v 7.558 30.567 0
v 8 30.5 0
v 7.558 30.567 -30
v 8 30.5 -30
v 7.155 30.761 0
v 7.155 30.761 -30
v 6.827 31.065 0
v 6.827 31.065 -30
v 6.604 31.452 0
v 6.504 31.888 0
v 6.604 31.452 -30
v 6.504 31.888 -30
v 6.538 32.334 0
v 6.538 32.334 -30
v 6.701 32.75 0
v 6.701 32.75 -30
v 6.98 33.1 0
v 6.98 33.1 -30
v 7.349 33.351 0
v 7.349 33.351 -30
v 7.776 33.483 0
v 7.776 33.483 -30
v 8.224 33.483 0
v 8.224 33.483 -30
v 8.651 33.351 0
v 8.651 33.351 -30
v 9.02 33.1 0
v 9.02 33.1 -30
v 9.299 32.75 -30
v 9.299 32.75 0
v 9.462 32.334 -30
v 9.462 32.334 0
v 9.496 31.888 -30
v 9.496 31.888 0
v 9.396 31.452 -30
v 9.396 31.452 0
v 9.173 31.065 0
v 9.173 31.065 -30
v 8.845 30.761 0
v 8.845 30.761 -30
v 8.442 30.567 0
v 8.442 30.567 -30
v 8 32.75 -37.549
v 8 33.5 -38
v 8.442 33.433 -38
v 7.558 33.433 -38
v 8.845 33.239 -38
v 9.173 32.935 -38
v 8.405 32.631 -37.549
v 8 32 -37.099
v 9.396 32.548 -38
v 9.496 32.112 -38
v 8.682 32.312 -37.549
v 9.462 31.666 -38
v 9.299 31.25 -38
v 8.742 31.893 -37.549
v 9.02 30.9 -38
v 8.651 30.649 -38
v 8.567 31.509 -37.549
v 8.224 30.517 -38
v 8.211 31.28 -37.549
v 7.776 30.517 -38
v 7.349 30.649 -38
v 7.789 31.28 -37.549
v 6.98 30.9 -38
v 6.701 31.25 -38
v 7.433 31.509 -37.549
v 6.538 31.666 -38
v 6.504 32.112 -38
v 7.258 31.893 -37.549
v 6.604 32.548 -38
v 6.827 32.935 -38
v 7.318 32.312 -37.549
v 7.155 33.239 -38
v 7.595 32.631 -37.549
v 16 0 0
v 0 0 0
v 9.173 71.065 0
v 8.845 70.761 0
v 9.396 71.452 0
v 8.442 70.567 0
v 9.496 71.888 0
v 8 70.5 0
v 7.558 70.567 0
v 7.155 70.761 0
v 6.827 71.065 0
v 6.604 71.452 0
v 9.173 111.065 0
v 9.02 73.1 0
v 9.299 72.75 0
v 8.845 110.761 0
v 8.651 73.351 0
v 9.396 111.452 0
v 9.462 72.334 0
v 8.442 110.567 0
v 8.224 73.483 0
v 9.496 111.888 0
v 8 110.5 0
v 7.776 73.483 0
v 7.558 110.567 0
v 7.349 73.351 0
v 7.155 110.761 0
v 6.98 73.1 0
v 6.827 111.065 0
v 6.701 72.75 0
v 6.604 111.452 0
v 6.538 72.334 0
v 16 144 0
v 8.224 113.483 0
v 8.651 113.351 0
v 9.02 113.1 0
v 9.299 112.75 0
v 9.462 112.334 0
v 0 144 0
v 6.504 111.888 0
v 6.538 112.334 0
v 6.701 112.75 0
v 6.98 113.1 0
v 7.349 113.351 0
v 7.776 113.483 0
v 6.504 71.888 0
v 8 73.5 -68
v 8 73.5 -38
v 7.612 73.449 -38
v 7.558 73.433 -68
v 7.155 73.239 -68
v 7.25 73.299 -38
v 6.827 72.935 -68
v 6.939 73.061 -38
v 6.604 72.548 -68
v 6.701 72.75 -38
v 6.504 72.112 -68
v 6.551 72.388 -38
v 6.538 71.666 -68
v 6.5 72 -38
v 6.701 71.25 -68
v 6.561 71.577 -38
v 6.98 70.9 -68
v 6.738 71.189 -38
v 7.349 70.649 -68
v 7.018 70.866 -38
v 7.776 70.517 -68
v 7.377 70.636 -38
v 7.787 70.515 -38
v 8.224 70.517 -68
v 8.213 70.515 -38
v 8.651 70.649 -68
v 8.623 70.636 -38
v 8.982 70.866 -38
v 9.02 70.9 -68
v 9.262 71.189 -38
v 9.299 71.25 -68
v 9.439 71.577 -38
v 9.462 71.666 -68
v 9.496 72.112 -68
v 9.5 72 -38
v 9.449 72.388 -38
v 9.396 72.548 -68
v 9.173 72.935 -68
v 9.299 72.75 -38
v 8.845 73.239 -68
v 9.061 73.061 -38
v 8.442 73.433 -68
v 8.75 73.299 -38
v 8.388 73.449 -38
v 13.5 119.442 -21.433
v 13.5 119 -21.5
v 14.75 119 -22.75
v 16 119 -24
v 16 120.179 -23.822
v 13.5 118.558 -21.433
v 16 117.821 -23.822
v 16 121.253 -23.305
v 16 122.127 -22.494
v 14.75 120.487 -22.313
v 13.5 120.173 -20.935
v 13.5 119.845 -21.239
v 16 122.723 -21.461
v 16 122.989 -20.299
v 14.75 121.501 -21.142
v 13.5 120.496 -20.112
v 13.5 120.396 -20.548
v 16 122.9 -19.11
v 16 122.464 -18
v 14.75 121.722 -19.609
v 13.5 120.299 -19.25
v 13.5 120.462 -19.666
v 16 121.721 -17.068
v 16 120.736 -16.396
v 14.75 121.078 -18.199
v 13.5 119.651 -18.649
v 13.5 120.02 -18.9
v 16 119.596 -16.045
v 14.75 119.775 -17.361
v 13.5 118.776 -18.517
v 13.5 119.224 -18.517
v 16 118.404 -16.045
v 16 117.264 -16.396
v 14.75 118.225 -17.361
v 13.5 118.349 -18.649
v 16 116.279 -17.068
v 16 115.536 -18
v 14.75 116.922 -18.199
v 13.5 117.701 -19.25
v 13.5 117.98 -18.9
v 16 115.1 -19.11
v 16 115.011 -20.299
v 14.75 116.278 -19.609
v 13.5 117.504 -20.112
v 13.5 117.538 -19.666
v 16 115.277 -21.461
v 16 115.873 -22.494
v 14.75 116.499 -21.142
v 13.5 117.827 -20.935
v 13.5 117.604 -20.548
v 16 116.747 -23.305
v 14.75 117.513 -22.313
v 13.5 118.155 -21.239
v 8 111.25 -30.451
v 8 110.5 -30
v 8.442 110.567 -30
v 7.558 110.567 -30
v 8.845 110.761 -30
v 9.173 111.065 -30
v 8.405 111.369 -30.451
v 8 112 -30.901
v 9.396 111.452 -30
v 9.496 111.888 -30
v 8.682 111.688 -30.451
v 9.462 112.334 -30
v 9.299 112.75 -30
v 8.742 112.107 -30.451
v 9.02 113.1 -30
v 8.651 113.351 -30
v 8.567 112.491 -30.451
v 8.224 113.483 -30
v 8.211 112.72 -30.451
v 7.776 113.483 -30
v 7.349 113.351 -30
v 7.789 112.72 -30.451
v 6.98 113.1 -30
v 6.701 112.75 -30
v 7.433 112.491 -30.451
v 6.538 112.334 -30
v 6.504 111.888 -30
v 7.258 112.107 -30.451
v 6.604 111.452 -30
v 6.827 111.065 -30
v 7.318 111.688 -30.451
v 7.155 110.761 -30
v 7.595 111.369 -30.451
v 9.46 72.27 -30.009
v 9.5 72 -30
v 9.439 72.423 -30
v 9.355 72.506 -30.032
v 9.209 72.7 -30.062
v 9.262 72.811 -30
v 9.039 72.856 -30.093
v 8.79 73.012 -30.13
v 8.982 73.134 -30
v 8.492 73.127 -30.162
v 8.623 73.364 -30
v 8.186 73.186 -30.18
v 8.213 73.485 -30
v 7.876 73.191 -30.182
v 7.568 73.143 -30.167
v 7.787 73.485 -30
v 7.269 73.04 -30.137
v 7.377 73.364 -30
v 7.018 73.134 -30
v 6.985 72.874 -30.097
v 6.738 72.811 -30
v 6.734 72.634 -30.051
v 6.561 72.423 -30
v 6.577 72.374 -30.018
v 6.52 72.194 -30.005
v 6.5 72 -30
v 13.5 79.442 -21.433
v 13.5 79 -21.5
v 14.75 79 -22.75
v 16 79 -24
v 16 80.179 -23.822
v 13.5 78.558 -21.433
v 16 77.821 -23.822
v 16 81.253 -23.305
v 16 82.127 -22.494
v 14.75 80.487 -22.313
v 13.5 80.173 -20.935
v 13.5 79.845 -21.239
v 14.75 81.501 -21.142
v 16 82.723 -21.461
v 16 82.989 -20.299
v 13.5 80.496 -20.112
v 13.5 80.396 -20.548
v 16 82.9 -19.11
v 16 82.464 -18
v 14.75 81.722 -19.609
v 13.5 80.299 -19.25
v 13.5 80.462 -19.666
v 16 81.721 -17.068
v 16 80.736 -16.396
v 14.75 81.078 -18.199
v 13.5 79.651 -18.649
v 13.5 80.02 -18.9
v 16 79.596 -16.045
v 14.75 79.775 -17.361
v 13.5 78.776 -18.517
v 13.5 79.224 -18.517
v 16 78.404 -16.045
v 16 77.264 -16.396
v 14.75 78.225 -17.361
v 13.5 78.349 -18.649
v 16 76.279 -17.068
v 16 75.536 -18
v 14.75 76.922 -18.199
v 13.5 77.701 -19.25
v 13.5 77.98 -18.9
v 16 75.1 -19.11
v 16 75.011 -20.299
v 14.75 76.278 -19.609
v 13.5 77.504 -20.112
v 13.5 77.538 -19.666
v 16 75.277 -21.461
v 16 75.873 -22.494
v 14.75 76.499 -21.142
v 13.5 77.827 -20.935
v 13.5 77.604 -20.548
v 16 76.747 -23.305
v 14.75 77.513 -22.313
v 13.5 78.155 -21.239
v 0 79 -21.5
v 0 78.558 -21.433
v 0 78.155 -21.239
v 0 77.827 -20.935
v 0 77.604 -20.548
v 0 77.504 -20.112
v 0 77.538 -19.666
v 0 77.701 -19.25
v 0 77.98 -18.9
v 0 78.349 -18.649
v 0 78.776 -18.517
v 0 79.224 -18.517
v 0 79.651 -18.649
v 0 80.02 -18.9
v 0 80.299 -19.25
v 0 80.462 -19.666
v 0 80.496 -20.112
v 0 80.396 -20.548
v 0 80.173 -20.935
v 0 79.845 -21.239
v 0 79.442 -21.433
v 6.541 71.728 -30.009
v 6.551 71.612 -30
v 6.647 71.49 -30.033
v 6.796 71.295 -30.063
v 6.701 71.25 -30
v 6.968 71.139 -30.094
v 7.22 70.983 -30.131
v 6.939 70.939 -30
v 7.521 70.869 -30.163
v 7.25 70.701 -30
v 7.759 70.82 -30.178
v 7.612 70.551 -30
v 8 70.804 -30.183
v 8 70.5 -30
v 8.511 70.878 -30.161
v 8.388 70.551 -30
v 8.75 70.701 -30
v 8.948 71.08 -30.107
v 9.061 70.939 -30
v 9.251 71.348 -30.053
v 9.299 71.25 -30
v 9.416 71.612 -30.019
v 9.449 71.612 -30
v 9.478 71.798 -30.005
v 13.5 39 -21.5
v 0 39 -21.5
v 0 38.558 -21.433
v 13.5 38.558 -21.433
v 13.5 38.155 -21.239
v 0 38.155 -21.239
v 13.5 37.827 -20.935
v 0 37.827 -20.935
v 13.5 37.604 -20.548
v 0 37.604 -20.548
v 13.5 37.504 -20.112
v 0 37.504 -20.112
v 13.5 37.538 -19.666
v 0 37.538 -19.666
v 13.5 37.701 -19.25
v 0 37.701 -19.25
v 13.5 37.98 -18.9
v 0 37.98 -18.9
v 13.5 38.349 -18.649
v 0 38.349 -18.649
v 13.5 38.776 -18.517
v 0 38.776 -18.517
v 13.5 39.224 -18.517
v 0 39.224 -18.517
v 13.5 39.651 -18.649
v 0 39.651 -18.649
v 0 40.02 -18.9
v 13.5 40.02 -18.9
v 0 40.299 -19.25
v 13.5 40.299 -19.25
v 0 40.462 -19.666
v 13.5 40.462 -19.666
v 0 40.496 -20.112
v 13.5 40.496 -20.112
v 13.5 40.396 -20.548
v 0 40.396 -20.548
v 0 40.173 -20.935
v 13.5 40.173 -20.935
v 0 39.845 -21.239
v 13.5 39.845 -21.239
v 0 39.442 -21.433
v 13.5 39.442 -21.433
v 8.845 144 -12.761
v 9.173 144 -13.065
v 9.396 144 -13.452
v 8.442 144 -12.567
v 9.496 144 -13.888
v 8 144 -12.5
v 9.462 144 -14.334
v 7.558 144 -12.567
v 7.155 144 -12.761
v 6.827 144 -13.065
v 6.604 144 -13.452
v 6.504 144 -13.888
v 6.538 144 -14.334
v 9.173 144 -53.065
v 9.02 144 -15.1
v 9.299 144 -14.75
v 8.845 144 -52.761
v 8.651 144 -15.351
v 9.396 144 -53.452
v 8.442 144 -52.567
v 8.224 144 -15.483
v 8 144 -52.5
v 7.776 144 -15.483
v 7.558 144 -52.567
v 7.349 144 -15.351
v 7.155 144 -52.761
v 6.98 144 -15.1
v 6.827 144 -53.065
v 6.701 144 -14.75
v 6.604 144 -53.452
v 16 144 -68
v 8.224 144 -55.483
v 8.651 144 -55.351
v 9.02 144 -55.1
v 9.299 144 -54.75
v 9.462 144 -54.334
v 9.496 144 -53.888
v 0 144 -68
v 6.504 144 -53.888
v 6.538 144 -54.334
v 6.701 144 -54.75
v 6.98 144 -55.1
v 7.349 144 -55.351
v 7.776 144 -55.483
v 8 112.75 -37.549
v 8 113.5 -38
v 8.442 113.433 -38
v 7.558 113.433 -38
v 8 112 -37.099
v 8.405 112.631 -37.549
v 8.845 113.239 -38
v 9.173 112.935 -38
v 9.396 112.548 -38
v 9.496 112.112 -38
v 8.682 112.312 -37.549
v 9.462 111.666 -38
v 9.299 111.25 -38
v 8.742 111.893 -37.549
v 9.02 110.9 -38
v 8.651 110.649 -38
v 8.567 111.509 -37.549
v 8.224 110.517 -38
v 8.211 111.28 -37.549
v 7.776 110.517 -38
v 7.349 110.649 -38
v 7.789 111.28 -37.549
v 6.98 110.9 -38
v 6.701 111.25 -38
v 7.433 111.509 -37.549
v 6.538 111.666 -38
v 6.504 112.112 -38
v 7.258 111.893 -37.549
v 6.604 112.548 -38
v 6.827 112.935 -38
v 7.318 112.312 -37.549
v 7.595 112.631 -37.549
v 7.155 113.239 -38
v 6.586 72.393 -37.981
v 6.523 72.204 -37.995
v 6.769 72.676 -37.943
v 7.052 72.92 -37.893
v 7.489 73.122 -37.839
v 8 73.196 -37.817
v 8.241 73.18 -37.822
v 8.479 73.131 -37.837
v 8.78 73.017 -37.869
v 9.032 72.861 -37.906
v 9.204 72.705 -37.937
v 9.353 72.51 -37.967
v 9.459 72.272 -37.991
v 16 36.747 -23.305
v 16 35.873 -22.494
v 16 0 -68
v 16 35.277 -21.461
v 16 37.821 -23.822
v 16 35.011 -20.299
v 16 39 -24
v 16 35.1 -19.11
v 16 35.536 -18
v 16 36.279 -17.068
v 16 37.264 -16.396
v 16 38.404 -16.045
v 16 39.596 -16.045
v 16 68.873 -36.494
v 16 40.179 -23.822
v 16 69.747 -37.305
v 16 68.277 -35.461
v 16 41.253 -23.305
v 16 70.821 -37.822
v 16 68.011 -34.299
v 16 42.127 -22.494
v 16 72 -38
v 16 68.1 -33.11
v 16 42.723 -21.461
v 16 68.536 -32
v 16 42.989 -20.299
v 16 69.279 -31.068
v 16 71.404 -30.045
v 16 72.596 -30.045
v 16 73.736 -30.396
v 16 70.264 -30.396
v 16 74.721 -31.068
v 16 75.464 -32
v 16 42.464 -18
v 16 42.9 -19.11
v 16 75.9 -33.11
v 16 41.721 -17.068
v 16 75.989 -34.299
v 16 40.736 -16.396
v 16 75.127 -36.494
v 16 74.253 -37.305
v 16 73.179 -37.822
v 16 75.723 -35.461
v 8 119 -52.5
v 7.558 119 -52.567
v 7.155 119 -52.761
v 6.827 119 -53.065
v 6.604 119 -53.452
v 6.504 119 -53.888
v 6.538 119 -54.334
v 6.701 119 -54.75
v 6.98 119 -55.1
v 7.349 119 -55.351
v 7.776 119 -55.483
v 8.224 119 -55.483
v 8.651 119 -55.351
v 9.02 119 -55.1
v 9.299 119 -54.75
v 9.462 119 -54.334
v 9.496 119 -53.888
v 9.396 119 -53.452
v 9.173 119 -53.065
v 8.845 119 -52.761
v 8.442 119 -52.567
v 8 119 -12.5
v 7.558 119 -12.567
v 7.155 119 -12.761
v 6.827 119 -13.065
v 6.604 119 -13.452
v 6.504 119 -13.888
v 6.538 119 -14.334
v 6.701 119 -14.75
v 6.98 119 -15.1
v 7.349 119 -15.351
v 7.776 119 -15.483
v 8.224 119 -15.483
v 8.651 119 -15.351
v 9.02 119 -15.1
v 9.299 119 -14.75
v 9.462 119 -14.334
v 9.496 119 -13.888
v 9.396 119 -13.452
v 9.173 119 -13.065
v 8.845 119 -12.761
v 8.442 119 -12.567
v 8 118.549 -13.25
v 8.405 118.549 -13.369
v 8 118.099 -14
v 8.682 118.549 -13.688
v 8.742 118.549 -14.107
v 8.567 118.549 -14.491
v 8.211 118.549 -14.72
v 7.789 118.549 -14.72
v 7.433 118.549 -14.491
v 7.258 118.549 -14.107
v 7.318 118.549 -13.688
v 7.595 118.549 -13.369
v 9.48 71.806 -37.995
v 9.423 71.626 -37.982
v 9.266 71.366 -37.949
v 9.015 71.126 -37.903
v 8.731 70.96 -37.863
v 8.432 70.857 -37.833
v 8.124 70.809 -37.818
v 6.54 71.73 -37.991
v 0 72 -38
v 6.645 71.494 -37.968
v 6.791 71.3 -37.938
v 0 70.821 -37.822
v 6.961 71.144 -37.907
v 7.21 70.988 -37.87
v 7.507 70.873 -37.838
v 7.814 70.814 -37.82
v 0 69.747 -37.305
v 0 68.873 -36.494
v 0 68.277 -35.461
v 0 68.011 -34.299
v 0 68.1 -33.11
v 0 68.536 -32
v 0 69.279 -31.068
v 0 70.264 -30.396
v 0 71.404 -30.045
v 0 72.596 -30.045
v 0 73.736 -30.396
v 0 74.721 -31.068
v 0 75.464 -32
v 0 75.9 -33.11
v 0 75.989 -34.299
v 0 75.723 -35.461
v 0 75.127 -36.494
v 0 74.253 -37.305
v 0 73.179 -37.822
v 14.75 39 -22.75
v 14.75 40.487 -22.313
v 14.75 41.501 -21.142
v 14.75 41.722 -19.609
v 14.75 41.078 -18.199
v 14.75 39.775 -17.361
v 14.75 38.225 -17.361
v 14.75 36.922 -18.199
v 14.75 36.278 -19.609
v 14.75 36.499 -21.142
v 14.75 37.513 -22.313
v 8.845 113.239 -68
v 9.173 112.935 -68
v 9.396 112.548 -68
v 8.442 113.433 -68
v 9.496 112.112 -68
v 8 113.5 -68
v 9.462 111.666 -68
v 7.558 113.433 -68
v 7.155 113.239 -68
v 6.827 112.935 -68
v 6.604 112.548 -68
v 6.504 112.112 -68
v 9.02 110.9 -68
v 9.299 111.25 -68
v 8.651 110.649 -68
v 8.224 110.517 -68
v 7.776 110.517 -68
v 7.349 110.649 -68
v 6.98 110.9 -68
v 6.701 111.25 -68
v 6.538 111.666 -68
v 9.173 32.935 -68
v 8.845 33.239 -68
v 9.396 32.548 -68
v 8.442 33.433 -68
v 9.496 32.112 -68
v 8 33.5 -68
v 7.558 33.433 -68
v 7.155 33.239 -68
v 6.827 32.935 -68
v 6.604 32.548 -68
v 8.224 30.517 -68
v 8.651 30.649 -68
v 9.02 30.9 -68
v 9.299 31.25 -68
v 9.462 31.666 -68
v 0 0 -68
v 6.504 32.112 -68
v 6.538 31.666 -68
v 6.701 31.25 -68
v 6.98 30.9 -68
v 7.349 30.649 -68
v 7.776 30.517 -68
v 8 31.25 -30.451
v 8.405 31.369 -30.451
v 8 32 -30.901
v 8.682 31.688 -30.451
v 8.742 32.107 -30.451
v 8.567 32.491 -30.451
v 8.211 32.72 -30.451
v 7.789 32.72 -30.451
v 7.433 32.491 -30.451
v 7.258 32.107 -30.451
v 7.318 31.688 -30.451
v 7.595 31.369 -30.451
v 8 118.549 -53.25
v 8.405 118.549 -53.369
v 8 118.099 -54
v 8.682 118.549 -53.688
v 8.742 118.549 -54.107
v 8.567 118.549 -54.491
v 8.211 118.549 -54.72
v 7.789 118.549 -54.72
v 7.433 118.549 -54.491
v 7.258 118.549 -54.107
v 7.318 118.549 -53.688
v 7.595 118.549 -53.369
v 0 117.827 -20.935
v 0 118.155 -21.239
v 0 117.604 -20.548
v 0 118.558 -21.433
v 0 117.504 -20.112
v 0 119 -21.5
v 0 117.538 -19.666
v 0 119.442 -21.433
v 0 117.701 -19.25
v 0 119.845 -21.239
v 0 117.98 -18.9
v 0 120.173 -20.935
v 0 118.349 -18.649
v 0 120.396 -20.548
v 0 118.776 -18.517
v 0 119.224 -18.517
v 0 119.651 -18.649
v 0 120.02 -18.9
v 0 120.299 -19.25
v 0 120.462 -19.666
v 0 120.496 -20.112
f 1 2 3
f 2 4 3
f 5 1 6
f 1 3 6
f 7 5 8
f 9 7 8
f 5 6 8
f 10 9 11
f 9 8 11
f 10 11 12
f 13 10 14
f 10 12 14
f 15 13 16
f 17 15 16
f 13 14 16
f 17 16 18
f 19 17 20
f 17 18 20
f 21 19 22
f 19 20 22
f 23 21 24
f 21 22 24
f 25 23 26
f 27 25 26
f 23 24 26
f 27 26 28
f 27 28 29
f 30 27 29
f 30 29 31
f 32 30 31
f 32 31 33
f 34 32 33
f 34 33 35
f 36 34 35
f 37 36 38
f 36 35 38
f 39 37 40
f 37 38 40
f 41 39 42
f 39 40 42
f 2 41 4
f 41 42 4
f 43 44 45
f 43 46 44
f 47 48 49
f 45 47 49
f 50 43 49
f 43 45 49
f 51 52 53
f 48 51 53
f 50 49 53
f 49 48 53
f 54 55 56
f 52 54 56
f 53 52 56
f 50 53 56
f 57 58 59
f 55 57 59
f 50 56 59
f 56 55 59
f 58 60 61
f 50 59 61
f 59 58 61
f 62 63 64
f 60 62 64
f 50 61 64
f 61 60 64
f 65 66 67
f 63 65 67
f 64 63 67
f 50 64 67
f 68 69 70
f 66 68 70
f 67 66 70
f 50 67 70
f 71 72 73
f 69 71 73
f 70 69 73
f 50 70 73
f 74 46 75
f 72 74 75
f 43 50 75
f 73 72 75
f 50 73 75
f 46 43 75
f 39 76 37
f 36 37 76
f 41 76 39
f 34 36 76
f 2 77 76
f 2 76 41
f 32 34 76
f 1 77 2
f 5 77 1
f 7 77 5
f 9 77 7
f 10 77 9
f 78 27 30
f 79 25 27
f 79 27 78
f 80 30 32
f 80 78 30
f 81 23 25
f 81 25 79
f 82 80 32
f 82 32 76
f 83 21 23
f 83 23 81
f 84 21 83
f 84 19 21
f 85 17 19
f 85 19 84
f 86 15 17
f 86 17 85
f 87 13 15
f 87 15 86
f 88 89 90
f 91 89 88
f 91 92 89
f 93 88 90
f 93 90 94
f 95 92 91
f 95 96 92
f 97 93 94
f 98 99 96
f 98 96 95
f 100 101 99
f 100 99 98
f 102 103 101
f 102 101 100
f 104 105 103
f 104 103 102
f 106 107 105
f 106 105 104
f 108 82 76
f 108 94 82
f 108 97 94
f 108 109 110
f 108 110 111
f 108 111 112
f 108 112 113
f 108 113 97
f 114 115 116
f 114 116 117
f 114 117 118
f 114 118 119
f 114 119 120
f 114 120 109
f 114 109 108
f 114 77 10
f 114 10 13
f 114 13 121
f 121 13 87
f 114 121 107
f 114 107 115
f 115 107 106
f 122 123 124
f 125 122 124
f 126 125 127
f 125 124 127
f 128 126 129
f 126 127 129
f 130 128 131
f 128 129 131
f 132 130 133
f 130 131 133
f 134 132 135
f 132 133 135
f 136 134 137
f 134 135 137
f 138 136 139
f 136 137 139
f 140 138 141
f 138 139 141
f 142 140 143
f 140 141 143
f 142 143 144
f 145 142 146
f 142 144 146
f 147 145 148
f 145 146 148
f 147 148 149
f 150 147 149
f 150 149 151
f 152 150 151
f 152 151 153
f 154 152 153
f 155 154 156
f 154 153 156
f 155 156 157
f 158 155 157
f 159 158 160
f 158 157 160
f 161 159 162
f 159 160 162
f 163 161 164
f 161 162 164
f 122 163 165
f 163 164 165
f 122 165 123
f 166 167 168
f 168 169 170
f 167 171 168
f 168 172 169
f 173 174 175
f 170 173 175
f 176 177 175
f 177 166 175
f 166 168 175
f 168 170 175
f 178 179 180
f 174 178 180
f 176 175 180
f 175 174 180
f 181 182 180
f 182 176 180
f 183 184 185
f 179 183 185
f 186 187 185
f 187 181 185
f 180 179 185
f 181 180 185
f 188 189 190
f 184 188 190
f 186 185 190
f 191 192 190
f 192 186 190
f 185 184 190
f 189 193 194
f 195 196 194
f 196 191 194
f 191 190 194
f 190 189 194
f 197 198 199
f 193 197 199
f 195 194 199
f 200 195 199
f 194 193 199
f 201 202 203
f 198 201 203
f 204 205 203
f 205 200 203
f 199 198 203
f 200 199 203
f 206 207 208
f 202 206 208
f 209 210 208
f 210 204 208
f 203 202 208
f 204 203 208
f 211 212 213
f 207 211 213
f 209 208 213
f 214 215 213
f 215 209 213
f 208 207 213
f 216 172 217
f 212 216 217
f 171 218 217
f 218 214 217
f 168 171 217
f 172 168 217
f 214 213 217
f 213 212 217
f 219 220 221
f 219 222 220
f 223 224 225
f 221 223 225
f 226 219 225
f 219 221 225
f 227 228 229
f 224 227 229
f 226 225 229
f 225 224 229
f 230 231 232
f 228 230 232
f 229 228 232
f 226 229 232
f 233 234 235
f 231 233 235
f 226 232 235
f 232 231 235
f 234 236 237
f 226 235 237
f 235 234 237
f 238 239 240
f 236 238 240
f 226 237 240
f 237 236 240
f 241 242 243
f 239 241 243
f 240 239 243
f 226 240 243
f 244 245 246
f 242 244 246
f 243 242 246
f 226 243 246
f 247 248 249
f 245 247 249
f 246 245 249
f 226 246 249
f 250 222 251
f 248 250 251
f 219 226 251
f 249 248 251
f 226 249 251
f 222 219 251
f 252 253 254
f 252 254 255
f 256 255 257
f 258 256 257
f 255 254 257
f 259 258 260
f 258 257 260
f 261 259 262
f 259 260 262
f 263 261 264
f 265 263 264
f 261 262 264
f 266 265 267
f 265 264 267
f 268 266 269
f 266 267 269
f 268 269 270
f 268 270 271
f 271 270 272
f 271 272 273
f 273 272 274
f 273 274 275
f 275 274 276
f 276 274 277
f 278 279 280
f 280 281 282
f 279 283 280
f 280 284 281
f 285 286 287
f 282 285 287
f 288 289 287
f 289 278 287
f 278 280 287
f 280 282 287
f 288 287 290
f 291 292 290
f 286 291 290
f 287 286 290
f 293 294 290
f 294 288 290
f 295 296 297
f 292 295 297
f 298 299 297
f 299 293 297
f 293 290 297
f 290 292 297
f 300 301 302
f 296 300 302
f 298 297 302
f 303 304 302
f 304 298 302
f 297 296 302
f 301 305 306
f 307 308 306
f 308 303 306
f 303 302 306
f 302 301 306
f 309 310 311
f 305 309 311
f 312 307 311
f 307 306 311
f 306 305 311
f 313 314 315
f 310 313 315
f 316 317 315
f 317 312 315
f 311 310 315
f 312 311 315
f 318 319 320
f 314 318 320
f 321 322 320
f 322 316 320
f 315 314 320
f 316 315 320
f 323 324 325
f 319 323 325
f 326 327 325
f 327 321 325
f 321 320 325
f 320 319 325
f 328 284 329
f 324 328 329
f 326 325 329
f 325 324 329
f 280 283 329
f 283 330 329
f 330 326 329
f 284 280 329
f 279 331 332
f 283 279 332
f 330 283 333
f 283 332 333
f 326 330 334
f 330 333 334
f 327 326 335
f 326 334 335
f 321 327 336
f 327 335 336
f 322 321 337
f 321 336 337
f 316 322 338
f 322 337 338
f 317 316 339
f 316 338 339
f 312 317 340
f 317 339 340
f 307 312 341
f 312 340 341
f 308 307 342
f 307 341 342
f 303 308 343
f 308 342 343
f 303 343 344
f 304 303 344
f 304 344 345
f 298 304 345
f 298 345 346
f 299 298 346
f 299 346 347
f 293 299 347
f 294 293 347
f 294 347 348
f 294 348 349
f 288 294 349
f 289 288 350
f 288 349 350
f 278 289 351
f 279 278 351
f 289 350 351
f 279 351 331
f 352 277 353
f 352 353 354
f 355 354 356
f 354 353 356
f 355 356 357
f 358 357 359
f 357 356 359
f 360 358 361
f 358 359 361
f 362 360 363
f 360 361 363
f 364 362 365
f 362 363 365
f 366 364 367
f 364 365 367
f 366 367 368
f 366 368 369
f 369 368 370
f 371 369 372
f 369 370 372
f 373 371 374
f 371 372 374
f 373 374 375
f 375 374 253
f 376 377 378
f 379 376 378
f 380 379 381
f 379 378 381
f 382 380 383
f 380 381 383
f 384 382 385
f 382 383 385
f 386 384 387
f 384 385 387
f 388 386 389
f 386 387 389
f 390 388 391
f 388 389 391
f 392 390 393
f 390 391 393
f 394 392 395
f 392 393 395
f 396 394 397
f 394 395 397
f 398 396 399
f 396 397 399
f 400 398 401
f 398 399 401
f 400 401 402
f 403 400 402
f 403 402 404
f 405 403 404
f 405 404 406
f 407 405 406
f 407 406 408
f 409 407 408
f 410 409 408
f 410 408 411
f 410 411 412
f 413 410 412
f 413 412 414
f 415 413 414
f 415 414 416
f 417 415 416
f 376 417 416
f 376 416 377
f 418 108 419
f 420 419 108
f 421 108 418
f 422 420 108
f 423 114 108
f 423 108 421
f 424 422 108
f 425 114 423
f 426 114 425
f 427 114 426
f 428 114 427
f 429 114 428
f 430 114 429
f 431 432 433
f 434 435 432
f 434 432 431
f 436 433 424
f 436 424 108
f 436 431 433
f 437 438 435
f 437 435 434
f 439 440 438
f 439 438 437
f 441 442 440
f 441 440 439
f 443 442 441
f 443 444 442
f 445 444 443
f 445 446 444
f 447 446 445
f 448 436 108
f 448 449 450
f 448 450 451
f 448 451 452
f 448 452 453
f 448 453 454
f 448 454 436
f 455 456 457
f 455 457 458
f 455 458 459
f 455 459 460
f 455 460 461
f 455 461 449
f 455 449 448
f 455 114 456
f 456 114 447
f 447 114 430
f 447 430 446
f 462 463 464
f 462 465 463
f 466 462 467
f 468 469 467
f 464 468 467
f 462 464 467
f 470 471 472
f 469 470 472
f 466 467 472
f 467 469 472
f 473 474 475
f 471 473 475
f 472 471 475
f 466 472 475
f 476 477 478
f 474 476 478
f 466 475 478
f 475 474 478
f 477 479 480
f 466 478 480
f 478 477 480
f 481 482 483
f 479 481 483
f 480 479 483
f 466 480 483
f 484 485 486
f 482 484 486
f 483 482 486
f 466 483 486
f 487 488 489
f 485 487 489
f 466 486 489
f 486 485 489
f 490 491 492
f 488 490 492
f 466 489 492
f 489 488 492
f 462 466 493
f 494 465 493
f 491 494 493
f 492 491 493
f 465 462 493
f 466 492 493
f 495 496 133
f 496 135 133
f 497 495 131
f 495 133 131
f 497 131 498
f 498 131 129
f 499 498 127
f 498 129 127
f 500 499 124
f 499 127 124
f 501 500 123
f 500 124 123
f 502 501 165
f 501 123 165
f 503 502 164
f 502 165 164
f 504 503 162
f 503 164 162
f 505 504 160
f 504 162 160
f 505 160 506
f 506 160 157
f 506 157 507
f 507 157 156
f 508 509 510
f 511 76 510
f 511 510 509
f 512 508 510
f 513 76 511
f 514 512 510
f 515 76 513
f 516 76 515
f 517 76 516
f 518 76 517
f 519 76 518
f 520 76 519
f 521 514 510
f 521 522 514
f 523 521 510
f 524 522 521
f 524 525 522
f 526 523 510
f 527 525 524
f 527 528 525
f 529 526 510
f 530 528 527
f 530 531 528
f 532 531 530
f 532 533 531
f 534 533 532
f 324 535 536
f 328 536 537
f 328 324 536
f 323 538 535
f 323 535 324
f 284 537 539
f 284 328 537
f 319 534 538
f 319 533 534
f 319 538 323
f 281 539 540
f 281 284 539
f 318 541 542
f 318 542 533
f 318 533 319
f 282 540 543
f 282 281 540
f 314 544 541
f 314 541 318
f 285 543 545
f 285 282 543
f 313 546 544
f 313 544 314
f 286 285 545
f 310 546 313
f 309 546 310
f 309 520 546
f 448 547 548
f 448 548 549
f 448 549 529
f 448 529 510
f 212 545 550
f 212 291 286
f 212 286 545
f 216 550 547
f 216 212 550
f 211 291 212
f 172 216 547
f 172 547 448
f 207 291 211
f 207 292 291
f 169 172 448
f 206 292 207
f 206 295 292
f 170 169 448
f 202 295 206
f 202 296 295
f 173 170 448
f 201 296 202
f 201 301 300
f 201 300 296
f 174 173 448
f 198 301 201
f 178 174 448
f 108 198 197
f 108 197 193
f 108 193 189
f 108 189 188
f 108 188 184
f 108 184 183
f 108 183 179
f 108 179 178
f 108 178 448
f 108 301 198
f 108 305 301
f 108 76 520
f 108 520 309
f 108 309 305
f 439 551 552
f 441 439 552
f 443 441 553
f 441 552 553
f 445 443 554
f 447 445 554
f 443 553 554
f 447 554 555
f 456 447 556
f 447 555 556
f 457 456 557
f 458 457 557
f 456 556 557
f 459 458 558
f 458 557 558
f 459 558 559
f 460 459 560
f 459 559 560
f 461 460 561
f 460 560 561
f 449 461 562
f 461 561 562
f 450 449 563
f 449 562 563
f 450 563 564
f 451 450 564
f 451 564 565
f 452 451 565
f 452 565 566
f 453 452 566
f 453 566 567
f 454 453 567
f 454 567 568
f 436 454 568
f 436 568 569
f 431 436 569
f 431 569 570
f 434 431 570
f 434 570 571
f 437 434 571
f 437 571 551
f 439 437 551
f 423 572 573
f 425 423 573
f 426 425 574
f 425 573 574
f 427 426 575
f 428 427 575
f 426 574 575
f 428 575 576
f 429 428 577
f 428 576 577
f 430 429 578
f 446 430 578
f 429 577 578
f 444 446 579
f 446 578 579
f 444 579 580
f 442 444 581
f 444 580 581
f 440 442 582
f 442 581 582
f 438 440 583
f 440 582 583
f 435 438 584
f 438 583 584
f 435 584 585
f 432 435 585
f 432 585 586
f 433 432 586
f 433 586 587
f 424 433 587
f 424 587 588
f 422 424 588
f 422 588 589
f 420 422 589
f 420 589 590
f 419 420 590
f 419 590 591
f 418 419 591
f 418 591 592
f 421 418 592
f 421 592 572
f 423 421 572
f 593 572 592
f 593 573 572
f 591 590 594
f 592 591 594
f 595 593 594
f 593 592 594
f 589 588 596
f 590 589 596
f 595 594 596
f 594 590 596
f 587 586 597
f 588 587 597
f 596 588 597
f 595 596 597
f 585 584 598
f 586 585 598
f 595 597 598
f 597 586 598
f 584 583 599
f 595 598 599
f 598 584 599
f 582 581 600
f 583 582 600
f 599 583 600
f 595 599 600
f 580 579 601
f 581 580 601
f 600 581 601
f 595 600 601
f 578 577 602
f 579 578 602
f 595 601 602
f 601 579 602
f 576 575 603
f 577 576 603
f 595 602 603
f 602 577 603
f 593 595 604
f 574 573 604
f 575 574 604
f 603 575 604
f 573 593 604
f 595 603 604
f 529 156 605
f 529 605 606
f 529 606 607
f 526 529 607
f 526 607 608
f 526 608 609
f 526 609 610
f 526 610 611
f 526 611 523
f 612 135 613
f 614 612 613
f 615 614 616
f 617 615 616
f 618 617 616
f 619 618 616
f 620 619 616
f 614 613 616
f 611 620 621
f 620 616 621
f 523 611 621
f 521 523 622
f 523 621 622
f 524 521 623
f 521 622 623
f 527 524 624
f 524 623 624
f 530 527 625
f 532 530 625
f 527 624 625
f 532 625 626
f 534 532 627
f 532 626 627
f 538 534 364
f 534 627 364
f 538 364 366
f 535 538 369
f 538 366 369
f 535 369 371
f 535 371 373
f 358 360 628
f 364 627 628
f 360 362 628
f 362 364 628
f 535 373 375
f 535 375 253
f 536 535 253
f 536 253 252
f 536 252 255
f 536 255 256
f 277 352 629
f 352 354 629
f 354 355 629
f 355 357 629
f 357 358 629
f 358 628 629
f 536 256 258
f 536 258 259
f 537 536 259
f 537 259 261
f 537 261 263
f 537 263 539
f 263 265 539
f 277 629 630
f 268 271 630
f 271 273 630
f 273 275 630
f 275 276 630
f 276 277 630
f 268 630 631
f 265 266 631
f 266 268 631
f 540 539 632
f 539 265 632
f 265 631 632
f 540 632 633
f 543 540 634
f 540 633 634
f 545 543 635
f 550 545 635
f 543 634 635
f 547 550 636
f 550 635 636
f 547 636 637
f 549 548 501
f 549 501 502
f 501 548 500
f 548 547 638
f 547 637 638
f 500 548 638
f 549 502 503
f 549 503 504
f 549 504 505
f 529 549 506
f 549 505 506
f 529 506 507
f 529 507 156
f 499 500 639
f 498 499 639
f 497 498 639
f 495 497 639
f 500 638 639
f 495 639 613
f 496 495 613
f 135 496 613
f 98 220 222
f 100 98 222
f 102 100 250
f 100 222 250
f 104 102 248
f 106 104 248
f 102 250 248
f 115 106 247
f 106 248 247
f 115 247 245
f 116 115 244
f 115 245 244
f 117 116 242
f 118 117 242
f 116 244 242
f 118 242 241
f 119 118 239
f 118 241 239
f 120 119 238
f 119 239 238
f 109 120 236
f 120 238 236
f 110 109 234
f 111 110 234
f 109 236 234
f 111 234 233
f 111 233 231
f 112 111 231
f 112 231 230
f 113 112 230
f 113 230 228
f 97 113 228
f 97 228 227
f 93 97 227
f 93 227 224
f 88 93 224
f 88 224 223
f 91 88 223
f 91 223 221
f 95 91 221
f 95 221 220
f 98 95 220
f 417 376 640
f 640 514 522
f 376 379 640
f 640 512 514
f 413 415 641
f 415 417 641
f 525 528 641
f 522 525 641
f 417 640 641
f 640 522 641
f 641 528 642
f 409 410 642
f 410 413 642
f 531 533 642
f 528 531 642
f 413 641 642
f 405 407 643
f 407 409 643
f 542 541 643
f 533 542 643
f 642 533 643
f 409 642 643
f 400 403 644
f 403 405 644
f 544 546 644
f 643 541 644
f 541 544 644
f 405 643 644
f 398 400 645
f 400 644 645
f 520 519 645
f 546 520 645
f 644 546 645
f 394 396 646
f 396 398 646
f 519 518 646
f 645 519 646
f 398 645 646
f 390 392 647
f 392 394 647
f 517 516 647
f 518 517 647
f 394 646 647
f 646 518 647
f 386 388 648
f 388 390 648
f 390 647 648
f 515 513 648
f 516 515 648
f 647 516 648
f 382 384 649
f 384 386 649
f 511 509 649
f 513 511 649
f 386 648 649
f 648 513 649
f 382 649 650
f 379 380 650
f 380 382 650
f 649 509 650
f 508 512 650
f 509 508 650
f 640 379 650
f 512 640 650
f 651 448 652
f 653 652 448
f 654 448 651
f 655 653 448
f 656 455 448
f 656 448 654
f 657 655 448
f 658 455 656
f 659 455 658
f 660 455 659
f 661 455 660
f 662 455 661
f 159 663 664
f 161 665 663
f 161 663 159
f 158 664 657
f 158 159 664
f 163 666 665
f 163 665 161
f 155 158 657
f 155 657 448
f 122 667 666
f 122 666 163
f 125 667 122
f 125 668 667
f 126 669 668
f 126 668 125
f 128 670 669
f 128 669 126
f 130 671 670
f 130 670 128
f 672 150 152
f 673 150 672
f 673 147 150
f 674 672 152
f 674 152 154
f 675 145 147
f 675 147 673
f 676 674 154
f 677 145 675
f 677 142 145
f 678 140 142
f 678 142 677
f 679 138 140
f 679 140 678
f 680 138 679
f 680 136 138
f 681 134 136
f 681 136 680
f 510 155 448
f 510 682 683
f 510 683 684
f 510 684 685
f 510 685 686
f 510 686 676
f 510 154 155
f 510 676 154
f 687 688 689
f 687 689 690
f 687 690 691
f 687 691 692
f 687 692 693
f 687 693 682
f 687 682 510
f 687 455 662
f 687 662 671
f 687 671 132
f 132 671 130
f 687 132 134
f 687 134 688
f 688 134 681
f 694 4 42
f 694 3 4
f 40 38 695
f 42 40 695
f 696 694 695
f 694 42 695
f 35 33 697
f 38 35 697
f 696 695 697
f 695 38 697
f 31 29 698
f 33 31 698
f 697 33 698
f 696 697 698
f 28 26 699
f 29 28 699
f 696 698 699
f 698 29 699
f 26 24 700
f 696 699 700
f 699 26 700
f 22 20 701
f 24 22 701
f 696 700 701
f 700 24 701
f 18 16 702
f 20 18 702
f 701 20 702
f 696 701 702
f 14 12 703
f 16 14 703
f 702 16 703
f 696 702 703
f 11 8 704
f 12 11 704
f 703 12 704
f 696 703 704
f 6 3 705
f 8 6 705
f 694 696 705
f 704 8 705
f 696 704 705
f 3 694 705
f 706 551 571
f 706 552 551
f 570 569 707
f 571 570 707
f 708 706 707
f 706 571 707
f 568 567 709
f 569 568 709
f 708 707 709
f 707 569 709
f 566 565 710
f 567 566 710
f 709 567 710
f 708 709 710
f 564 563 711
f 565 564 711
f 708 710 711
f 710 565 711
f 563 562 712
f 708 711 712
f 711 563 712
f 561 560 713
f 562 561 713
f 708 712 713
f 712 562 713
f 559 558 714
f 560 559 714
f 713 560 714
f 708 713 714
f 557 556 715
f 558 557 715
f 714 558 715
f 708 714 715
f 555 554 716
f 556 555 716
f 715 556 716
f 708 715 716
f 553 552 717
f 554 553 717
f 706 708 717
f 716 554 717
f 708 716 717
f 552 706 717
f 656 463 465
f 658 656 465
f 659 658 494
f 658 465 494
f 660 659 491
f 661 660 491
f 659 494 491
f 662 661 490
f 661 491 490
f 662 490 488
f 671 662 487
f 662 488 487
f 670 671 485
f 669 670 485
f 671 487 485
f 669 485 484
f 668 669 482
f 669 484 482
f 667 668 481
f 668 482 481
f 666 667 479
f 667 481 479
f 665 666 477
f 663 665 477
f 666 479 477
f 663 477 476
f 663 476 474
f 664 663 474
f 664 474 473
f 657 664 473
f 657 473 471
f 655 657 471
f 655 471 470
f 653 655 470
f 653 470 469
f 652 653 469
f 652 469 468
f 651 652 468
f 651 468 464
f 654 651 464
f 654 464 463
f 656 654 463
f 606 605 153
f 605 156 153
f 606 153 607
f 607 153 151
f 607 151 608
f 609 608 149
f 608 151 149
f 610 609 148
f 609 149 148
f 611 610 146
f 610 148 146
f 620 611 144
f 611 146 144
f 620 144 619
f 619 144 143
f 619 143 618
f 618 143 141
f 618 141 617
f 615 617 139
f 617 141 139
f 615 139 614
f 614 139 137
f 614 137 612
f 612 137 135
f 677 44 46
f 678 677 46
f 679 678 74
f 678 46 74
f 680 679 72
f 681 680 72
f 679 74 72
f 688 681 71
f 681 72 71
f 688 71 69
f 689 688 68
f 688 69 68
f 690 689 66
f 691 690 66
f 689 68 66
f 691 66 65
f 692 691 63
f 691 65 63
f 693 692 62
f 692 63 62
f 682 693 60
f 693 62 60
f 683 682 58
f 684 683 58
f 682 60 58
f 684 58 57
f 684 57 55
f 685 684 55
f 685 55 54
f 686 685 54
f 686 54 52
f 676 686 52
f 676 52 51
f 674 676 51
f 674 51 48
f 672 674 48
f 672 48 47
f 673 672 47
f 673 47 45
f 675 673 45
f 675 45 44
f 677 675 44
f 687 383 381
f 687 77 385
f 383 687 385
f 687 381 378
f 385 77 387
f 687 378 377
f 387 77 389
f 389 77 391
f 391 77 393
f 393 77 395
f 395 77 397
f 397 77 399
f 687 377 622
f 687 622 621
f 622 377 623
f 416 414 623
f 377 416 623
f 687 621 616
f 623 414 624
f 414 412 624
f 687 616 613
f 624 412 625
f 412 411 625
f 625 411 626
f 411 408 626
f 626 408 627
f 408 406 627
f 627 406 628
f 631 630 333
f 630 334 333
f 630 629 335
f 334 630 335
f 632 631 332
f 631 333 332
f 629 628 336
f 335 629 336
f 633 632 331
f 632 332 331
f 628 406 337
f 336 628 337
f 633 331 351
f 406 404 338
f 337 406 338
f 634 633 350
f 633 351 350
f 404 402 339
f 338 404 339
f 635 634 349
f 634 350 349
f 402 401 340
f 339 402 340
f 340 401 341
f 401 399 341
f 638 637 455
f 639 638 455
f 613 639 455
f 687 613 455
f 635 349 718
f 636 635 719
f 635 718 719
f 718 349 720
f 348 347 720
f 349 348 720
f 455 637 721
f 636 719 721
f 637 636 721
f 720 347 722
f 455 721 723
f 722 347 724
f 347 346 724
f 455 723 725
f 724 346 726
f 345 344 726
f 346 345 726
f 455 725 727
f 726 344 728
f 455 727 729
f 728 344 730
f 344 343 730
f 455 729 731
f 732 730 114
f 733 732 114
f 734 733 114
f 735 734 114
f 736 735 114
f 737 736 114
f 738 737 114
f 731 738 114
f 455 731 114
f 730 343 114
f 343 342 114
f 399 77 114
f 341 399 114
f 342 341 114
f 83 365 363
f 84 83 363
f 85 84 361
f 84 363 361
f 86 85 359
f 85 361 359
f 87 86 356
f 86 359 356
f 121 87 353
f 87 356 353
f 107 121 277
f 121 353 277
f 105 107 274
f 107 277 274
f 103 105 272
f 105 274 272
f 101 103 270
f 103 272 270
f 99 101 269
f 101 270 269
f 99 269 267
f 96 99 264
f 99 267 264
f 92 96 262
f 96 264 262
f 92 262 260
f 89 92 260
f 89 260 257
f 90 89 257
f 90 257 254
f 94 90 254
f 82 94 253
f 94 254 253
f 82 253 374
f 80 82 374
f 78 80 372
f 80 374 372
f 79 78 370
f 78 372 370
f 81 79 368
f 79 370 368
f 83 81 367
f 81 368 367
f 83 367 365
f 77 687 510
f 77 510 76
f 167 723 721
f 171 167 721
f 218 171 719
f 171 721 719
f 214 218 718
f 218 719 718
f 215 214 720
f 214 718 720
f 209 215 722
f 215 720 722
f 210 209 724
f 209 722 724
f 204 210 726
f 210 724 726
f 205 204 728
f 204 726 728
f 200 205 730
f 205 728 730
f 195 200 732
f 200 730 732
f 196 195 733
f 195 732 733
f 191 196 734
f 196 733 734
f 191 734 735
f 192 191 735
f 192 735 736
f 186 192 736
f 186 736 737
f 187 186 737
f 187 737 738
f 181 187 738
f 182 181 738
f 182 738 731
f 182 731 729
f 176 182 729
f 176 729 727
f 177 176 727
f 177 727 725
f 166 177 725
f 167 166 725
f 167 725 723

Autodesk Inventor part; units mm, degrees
ref_plane "YZ Plane" through (0, 0, 0) normal (1, 0, 0) x (0, 1, 0)
ref_plane "XZ Plane" through (0, 0, 0) normal (0, 1, 0) x (-1, 0, 0)
ref_plane "XY Plane" through (0, 0, 0) normal (0, 0, 1) x (1, 0, 0)
sketch "Skizze1" plane through (0, 0, 0) normal (1, 0, 0) x (0, 1, 0)
  line L0 (0, 0) -> (144, 0)
  line L1 (144, 0) -> (144, -68)
  line L2 (144, -68) -> (0, -68)
  line L3 (0, -68) -> (0, 0)
  dimension "d0" = 144
  dimension "d1" = 68
extrude "Extrusion1" add sketch "Skizze1" along normal blind 16
sketch "Skizze2" plane through (0, 0, 0) normal (0, 0, 1) x (1, 0, 0)
  line L0 (0, 0) -> (0, 144) construction
  line L1 (0, 72) -> (16, 72) construction
  line L2 (16, 144) -> (16, 0) construction
  line L3 (0, 144) -> (16, 144) construction
  line L4 (8, 144) -> (8, 0) construction
  line L5 (0, 144) -> (16, 144) construction
  line L6 (0, 0) -> (16, 0) construction
  line L7 (0, 144) -> (16, 144) construction
  line L8 (16, 144) -> (16, 0) construction
  line L9 (16, 0) -> (0, 0) construction
  line L10 (0, 0) -> (0, 144) construction
  line L11 (0, 112) -> (16, 112) construction
  line L12 (0, 32) -> (16, 32) construction
  point P0 (8, 112)
  point P1 (8, 72)
  point P2 (8, 32)
  dimension "d4" = 40
  dimension "d5" = 40
hole "Bohrung1" at (8, 112, 0) at (8, 72, 0) at (8, 32, 0) direction (0, 0, -1) diameter 3 depth 30 tip angle 118
sketch "Skizze3" plane through (0, 144, 0) normal (0, 1, 0) x (1, 0, 0)
  line L0 (0, 0) -> (16, 0)
  line L1 (16, 0) -> (16, 68)
  line L2 (16, 68) -> (0, 68)
  line L3 (0, 68) -> (0, 0)
  line L4 (8, 0) -> (8, 68) construction
  line L5 (0, 68) -> (16, 68) construction
  line L6 (16, 0) -> (16, 68) construction
  line L7 (16, 34) -> (0, 34) construction
  line L8 (0, 68) -> (0, 0) construction
  line L9 (0, 14) -> (16, 14) construction
  line L10 (0, 54) -> (16, 54) construction
  point P0 (8, 14)
  point P1 (8, 54)
  dimension "d13" = 14
  dimension "d22" = 14
hole "Bohrung2" at (8, 144, -14) at (8, 144, -54) direction (0, -1, 0) diameter 3 depth 25 tip angle 118
sketch "Skizze4" plane through (0, 0, -68) normal (0, 0, -1) x (-1, 0, 0)
  line L0 (0, 0) -> (-16, 0) construction
  line L1 (-16, 0) -> (-16, 144) construction
  line L2 (-16, 144) -> (0, 144) construction
  line L3 (0, 144) -> (0, 0) construction
  line L4 (-8, 0) -> (-8, 144) construction
  line L5 (-16, 144) -> (-16, 0) construction
  line L6 (-16, 72) -> (0, 72) construction
  circle A0 centre (-8, 72) radius 1.5 construction
  point P0 (-8, 112)
  point P1 (-8, 32)
  dimension "d23" = 40
  dimension "d24" = 40
hole "Bohrung3" at (8, 72, -68) at (8, 112, -68) at (8, 32, -68) direction (0, 0, 1) diameter 3 depth 30 tip angle 118
sketch "Skizze5" plane through (16, 0, 0) normal (1, 0, 0) x (0, 0, -1)
  line L0 (68, 144) -> (0, 144) construction
  line L1 (0, 144) -> (0, 0) construction
  line L2 (0, 0) -> (68, 0) construction
  line L3 (68, 0) -> (68, 144) construction
  line L4 (0, 144) -> (0, 0) construction
  line L5 (0, 72) -> (68, 72) construction
  circle A0 centre (34, 72) radius 4 construction
  line L6 (20, 119) -> (20, 39) construction
  point P0 (20, 79)
  dimension "d41" = 8
  dimension "d42" = 7
  dimension "d43" = 40
  dimension "d44" = 40
  dimension "d45" = 20
hole "Bohrung4" at (16, 39, -20) at (16, 79, -20) at (16, 119, -20) direction (-1, 0, 0) diameter 3 end through all countersink diameter 8 countersink angle 90
hole "Bohrung5" at (16, 72, -34) direction (-1, 0, 0) diameter 8 end through all
equation "\"d39\" = Stärke"
equation "\"d51\" = Stärke"
equation "\"Biegeradius\" = Stärke"
equation "\"BreiteBiegungsfreistellung\" = Stärke"
equation "\"TiefeBiegungsfreistellung\" = 0.5 * Stärke"
equation "\"GrößeEckenfreistellung\" = 4 * Stärke"
equation "\"MinimalRest\" = 2 * Stärke"
equation "\"Übergangsradius\" = Biegeradius"
equation "\"JacobiRadiusGröße\" = Biegeradius"
equation "\"Abstandsgröße\" = Stärke"
equation "\"Stärke\" = 0.5"
properties part number "licht_200_side_right"
